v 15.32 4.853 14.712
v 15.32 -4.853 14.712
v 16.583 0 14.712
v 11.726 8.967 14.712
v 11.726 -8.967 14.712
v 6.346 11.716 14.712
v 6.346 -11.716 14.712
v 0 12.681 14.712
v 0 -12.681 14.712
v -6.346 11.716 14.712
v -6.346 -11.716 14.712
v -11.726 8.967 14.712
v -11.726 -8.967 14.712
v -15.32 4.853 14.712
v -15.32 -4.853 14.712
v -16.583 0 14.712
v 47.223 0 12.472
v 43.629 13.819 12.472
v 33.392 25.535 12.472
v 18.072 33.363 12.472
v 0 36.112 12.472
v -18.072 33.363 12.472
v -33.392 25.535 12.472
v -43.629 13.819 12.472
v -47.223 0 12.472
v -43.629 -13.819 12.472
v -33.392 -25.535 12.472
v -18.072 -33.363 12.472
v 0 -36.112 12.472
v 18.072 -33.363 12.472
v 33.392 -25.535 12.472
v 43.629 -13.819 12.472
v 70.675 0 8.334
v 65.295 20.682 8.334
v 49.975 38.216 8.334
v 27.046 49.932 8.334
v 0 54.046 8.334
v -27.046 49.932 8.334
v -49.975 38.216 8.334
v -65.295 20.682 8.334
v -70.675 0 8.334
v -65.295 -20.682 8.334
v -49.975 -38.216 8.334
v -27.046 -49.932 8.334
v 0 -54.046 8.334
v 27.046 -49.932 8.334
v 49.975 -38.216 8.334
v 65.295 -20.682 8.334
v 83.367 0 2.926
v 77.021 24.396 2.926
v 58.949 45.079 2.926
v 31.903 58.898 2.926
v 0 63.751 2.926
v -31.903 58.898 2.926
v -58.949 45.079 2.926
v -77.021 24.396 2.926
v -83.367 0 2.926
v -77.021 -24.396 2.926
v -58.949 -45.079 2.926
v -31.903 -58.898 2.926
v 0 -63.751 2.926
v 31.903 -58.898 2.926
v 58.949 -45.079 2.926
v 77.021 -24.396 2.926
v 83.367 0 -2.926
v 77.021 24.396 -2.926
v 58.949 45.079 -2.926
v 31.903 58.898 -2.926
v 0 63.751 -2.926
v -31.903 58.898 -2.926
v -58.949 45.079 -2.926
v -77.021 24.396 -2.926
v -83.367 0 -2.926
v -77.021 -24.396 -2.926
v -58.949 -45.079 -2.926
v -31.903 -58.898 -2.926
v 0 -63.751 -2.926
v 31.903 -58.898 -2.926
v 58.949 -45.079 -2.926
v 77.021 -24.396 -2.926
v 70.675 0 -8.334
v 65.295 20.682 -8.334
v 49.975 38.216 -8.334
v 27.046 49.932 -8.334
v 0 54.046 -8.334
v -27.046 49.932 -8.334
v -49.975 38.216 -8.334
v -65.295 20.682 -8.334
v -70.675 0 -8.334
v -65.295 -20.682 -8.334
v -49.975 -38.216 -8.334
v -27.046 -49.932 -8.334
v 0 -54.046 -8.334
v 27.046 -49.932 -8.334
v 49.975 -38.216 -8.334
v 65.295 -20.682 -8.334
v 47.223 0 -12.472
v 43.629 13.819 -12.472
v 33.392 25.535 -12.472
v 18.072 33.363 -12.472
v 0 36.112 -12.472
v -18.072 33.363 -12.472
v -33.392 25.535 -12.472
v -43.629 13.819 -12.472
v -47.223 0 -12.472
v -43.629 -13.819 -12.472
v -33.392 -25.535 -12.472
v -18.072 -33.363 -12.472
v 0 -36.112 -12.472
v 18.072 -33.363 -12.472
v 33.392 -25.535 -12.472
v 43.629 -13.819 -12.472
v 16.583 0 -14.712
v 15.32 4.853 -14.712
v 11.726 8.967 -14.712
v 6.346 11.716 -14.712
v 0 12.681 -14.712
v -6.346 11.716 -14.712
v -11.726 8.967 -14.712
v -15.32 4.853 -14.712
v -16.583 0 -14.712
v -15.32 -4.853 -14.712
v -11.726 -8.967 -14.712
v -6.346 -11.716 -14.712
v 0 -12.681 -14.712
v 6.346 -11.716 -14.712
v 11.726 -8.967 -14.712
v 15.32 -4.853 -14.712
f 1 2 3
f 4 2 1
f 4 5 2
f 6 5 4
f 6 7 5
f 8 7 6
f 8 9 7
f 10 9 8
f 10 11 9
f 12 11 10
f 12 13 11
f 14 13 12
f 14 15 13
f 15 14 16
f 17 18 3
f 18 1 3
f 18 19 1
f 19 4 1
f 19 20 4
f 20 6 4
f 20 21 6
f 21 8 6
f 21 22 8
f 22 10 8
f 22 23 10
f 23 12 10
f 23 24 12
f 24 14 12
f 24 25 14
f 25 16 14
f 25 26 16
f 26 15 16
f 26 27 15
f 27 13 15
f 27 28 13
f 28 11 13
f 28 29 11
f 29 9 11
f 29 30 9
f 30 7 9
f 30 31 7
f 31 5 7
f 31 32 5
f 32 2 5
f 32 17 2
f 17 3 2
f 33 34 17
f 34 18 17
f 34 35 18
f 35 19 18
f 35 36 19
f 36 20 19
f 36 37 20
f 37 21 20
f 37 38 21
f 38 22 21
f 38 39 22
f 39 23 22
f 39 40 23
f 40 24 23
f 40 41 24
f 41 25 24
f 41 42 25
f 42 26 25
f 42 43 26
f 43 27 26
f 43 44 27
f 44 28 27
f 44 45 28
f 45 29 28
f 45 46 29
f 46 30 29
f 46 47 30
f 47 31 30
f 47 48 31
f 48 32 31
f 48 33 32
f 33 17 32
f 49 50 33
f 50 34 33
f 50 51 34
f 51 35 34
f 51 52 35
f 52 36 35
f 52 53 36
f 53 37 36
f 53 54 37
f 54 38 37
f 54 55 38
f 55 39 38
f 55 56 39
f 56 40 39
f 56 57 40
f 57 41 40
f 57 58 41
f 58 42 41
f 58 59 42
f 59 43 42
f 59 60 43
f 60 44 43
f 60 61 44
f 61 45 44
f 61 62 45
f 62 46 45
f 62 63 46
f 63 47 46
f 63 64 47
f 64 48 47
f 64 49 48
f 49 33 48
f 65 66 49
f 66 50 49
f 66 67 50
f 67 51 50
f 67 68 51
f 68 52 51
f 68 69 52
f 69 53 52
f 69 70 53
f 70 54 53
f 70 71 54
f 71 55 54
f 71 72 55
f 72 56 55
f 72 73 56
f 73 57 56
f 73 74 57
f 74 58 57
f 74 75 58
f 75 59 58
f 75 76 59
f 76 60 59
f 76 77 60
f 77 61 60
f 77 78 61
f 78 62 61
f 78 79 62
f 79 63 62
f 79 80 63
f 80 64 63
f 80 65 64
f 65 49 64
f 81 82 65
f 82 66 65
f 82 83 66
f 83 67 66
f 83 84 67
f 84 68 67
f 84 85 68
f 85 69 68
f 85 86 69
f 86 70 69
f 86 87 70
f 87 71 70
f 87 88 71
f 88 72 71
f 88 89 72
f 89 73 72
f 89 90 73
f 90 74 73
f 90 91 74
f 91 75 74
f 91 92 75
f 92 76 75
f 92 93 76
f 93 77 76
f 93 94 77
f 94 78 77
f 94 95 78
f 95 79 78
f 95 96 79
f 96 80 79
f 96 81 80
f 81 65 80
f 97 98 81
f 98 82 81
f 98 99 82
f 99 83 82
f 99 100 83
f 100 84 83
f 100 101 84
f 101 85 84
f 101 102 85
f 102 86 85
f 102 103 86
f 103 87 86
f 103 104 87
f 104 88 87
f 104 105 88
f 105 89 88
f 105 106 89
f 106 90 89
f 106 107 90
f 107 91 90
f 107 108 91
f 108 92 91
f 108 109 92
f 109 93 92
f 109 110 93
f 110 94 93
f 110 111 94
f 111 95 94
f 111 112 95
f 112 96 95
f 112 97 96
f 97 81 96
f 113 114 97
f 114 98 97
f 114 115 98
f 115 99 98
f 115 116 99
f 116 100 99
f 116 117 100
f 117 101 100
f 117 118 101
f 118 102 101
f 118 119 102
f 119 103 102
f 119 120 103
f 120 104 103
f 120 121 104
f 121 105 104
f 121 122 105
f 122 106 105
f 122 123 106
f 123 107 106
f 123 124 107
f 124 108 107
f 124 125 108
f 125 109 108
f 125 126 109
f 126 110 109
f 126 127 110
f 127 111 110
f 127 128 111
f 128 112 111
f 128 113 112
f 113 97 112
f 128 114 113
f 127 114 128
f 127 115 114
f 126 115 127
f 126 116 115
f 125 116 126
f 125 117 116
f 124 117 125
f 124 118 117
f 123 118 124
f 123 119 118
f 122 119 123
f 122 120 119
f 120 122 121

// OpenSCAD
// Generated by SolidPython 1.0.1 on 2020-07-29 00:46:53


scale(v = [17, 13, 3]) {
	sphere(r = 5);
}
/***********************************************
*********      SolidPython code:      **********
************************************************
 
# import packages: SolidPython
from solid import *
from solid.utils import *
from itertools import chain, combinations, permutations


class Resize:

    def __init__(self, scad_file):
        self.scad_file = scad_file
        #self.scad_file = import_scad(scad_file)
        # cone/cylinder param:
        self.r1 = 0
        self.r2 = 0
        self.h = 0
        # rectangular prism param:
        self.w = 0
        self.l = 0
        # ellipse param:
        self.r = 0

    # import OpenScad code (file name corresponds to shape)


    # classify shape + parameters
    def assign(self, param1, param2, param3):
        if self.scad_file == 'cone.scad':
            self.r1 = param1
            self.r2 = param2
            self.h = param3
        elif self.scad_file == 'cylinder.scad':
            self.r1 = param1
            self.r2 = param2
            self.h = param3
        elif self.scad_file == 'rectangularPrism.scad':
            self.h = param1
            self.l = param2
            self.w = param3
        else:
            self.r = param1
            self.h = param2

    # resize parameters
    def iterate(self):
        x = range(3, 20, 2)
        i = 1
        if self.scad_file == 'cone.scad':
            tempList = list(permutations(x, 2))
            for temp in tempList:
                param1 = temp[0]
                param2 = temp[1]
                filepath = 'produced_scad_files/' + 'cone' + str(param1) + '_' + str(param2) + '_' + '.scad'
                scad_render_to_file(cylinder(h=param1, r1=param2, r2=0), filepath)

        elif self.scad_file == 'cylinder.scad':
            tempList = list(permutations(x, 3))
            for temp in tempList:
                param1 = temp[0]
                param2 = temp[1]
                filepath = 'produced_scad_files/' + 'cylinder' + str(param1) + '_' + str(param2) + '_' + '.scad'
                scad_render_to_file(cylinder(h=param1, r1=param2, r2=param2), filepath)

        elif self.scad_file == 'rectangularPrism.scad':
            tempList = list(permutations(x, 3))
            for temp in tempList:
                param1 = temp[0]
                param2 = temp[1]
                param3 = temp[2]
                filepath = 'produced_scad_files/' + 'rectangularPrism' + str(param1) + '_' + str(param2) + '_' + str(
                    param3) + '.scad'
                scad_render_to_file(cube(size=(param1, param2, param3)), filepath)

        elif self.scad_file == 'ellipse.scad':
            tempList = list(permutations(x, 4))
            for temp in tempList:
                param1 = temp[0]
                param2 = temp[1]
                param3 = temp[2]
                param4 = temp[3]
                filepath = 'produced_scad_files/' + 'ellipse' + str(param1) + '_' + str(param2) + '_' + str(param3) + '_' + str(param4) + '.scad'
                scad_render_to_file(scale([param1, param2, param3])(sphere(r=param4)), filepath)

    def render_to_scadfile(self):
        scad_render_to_file(scad, 'example.scad') 
 
************************************************/
